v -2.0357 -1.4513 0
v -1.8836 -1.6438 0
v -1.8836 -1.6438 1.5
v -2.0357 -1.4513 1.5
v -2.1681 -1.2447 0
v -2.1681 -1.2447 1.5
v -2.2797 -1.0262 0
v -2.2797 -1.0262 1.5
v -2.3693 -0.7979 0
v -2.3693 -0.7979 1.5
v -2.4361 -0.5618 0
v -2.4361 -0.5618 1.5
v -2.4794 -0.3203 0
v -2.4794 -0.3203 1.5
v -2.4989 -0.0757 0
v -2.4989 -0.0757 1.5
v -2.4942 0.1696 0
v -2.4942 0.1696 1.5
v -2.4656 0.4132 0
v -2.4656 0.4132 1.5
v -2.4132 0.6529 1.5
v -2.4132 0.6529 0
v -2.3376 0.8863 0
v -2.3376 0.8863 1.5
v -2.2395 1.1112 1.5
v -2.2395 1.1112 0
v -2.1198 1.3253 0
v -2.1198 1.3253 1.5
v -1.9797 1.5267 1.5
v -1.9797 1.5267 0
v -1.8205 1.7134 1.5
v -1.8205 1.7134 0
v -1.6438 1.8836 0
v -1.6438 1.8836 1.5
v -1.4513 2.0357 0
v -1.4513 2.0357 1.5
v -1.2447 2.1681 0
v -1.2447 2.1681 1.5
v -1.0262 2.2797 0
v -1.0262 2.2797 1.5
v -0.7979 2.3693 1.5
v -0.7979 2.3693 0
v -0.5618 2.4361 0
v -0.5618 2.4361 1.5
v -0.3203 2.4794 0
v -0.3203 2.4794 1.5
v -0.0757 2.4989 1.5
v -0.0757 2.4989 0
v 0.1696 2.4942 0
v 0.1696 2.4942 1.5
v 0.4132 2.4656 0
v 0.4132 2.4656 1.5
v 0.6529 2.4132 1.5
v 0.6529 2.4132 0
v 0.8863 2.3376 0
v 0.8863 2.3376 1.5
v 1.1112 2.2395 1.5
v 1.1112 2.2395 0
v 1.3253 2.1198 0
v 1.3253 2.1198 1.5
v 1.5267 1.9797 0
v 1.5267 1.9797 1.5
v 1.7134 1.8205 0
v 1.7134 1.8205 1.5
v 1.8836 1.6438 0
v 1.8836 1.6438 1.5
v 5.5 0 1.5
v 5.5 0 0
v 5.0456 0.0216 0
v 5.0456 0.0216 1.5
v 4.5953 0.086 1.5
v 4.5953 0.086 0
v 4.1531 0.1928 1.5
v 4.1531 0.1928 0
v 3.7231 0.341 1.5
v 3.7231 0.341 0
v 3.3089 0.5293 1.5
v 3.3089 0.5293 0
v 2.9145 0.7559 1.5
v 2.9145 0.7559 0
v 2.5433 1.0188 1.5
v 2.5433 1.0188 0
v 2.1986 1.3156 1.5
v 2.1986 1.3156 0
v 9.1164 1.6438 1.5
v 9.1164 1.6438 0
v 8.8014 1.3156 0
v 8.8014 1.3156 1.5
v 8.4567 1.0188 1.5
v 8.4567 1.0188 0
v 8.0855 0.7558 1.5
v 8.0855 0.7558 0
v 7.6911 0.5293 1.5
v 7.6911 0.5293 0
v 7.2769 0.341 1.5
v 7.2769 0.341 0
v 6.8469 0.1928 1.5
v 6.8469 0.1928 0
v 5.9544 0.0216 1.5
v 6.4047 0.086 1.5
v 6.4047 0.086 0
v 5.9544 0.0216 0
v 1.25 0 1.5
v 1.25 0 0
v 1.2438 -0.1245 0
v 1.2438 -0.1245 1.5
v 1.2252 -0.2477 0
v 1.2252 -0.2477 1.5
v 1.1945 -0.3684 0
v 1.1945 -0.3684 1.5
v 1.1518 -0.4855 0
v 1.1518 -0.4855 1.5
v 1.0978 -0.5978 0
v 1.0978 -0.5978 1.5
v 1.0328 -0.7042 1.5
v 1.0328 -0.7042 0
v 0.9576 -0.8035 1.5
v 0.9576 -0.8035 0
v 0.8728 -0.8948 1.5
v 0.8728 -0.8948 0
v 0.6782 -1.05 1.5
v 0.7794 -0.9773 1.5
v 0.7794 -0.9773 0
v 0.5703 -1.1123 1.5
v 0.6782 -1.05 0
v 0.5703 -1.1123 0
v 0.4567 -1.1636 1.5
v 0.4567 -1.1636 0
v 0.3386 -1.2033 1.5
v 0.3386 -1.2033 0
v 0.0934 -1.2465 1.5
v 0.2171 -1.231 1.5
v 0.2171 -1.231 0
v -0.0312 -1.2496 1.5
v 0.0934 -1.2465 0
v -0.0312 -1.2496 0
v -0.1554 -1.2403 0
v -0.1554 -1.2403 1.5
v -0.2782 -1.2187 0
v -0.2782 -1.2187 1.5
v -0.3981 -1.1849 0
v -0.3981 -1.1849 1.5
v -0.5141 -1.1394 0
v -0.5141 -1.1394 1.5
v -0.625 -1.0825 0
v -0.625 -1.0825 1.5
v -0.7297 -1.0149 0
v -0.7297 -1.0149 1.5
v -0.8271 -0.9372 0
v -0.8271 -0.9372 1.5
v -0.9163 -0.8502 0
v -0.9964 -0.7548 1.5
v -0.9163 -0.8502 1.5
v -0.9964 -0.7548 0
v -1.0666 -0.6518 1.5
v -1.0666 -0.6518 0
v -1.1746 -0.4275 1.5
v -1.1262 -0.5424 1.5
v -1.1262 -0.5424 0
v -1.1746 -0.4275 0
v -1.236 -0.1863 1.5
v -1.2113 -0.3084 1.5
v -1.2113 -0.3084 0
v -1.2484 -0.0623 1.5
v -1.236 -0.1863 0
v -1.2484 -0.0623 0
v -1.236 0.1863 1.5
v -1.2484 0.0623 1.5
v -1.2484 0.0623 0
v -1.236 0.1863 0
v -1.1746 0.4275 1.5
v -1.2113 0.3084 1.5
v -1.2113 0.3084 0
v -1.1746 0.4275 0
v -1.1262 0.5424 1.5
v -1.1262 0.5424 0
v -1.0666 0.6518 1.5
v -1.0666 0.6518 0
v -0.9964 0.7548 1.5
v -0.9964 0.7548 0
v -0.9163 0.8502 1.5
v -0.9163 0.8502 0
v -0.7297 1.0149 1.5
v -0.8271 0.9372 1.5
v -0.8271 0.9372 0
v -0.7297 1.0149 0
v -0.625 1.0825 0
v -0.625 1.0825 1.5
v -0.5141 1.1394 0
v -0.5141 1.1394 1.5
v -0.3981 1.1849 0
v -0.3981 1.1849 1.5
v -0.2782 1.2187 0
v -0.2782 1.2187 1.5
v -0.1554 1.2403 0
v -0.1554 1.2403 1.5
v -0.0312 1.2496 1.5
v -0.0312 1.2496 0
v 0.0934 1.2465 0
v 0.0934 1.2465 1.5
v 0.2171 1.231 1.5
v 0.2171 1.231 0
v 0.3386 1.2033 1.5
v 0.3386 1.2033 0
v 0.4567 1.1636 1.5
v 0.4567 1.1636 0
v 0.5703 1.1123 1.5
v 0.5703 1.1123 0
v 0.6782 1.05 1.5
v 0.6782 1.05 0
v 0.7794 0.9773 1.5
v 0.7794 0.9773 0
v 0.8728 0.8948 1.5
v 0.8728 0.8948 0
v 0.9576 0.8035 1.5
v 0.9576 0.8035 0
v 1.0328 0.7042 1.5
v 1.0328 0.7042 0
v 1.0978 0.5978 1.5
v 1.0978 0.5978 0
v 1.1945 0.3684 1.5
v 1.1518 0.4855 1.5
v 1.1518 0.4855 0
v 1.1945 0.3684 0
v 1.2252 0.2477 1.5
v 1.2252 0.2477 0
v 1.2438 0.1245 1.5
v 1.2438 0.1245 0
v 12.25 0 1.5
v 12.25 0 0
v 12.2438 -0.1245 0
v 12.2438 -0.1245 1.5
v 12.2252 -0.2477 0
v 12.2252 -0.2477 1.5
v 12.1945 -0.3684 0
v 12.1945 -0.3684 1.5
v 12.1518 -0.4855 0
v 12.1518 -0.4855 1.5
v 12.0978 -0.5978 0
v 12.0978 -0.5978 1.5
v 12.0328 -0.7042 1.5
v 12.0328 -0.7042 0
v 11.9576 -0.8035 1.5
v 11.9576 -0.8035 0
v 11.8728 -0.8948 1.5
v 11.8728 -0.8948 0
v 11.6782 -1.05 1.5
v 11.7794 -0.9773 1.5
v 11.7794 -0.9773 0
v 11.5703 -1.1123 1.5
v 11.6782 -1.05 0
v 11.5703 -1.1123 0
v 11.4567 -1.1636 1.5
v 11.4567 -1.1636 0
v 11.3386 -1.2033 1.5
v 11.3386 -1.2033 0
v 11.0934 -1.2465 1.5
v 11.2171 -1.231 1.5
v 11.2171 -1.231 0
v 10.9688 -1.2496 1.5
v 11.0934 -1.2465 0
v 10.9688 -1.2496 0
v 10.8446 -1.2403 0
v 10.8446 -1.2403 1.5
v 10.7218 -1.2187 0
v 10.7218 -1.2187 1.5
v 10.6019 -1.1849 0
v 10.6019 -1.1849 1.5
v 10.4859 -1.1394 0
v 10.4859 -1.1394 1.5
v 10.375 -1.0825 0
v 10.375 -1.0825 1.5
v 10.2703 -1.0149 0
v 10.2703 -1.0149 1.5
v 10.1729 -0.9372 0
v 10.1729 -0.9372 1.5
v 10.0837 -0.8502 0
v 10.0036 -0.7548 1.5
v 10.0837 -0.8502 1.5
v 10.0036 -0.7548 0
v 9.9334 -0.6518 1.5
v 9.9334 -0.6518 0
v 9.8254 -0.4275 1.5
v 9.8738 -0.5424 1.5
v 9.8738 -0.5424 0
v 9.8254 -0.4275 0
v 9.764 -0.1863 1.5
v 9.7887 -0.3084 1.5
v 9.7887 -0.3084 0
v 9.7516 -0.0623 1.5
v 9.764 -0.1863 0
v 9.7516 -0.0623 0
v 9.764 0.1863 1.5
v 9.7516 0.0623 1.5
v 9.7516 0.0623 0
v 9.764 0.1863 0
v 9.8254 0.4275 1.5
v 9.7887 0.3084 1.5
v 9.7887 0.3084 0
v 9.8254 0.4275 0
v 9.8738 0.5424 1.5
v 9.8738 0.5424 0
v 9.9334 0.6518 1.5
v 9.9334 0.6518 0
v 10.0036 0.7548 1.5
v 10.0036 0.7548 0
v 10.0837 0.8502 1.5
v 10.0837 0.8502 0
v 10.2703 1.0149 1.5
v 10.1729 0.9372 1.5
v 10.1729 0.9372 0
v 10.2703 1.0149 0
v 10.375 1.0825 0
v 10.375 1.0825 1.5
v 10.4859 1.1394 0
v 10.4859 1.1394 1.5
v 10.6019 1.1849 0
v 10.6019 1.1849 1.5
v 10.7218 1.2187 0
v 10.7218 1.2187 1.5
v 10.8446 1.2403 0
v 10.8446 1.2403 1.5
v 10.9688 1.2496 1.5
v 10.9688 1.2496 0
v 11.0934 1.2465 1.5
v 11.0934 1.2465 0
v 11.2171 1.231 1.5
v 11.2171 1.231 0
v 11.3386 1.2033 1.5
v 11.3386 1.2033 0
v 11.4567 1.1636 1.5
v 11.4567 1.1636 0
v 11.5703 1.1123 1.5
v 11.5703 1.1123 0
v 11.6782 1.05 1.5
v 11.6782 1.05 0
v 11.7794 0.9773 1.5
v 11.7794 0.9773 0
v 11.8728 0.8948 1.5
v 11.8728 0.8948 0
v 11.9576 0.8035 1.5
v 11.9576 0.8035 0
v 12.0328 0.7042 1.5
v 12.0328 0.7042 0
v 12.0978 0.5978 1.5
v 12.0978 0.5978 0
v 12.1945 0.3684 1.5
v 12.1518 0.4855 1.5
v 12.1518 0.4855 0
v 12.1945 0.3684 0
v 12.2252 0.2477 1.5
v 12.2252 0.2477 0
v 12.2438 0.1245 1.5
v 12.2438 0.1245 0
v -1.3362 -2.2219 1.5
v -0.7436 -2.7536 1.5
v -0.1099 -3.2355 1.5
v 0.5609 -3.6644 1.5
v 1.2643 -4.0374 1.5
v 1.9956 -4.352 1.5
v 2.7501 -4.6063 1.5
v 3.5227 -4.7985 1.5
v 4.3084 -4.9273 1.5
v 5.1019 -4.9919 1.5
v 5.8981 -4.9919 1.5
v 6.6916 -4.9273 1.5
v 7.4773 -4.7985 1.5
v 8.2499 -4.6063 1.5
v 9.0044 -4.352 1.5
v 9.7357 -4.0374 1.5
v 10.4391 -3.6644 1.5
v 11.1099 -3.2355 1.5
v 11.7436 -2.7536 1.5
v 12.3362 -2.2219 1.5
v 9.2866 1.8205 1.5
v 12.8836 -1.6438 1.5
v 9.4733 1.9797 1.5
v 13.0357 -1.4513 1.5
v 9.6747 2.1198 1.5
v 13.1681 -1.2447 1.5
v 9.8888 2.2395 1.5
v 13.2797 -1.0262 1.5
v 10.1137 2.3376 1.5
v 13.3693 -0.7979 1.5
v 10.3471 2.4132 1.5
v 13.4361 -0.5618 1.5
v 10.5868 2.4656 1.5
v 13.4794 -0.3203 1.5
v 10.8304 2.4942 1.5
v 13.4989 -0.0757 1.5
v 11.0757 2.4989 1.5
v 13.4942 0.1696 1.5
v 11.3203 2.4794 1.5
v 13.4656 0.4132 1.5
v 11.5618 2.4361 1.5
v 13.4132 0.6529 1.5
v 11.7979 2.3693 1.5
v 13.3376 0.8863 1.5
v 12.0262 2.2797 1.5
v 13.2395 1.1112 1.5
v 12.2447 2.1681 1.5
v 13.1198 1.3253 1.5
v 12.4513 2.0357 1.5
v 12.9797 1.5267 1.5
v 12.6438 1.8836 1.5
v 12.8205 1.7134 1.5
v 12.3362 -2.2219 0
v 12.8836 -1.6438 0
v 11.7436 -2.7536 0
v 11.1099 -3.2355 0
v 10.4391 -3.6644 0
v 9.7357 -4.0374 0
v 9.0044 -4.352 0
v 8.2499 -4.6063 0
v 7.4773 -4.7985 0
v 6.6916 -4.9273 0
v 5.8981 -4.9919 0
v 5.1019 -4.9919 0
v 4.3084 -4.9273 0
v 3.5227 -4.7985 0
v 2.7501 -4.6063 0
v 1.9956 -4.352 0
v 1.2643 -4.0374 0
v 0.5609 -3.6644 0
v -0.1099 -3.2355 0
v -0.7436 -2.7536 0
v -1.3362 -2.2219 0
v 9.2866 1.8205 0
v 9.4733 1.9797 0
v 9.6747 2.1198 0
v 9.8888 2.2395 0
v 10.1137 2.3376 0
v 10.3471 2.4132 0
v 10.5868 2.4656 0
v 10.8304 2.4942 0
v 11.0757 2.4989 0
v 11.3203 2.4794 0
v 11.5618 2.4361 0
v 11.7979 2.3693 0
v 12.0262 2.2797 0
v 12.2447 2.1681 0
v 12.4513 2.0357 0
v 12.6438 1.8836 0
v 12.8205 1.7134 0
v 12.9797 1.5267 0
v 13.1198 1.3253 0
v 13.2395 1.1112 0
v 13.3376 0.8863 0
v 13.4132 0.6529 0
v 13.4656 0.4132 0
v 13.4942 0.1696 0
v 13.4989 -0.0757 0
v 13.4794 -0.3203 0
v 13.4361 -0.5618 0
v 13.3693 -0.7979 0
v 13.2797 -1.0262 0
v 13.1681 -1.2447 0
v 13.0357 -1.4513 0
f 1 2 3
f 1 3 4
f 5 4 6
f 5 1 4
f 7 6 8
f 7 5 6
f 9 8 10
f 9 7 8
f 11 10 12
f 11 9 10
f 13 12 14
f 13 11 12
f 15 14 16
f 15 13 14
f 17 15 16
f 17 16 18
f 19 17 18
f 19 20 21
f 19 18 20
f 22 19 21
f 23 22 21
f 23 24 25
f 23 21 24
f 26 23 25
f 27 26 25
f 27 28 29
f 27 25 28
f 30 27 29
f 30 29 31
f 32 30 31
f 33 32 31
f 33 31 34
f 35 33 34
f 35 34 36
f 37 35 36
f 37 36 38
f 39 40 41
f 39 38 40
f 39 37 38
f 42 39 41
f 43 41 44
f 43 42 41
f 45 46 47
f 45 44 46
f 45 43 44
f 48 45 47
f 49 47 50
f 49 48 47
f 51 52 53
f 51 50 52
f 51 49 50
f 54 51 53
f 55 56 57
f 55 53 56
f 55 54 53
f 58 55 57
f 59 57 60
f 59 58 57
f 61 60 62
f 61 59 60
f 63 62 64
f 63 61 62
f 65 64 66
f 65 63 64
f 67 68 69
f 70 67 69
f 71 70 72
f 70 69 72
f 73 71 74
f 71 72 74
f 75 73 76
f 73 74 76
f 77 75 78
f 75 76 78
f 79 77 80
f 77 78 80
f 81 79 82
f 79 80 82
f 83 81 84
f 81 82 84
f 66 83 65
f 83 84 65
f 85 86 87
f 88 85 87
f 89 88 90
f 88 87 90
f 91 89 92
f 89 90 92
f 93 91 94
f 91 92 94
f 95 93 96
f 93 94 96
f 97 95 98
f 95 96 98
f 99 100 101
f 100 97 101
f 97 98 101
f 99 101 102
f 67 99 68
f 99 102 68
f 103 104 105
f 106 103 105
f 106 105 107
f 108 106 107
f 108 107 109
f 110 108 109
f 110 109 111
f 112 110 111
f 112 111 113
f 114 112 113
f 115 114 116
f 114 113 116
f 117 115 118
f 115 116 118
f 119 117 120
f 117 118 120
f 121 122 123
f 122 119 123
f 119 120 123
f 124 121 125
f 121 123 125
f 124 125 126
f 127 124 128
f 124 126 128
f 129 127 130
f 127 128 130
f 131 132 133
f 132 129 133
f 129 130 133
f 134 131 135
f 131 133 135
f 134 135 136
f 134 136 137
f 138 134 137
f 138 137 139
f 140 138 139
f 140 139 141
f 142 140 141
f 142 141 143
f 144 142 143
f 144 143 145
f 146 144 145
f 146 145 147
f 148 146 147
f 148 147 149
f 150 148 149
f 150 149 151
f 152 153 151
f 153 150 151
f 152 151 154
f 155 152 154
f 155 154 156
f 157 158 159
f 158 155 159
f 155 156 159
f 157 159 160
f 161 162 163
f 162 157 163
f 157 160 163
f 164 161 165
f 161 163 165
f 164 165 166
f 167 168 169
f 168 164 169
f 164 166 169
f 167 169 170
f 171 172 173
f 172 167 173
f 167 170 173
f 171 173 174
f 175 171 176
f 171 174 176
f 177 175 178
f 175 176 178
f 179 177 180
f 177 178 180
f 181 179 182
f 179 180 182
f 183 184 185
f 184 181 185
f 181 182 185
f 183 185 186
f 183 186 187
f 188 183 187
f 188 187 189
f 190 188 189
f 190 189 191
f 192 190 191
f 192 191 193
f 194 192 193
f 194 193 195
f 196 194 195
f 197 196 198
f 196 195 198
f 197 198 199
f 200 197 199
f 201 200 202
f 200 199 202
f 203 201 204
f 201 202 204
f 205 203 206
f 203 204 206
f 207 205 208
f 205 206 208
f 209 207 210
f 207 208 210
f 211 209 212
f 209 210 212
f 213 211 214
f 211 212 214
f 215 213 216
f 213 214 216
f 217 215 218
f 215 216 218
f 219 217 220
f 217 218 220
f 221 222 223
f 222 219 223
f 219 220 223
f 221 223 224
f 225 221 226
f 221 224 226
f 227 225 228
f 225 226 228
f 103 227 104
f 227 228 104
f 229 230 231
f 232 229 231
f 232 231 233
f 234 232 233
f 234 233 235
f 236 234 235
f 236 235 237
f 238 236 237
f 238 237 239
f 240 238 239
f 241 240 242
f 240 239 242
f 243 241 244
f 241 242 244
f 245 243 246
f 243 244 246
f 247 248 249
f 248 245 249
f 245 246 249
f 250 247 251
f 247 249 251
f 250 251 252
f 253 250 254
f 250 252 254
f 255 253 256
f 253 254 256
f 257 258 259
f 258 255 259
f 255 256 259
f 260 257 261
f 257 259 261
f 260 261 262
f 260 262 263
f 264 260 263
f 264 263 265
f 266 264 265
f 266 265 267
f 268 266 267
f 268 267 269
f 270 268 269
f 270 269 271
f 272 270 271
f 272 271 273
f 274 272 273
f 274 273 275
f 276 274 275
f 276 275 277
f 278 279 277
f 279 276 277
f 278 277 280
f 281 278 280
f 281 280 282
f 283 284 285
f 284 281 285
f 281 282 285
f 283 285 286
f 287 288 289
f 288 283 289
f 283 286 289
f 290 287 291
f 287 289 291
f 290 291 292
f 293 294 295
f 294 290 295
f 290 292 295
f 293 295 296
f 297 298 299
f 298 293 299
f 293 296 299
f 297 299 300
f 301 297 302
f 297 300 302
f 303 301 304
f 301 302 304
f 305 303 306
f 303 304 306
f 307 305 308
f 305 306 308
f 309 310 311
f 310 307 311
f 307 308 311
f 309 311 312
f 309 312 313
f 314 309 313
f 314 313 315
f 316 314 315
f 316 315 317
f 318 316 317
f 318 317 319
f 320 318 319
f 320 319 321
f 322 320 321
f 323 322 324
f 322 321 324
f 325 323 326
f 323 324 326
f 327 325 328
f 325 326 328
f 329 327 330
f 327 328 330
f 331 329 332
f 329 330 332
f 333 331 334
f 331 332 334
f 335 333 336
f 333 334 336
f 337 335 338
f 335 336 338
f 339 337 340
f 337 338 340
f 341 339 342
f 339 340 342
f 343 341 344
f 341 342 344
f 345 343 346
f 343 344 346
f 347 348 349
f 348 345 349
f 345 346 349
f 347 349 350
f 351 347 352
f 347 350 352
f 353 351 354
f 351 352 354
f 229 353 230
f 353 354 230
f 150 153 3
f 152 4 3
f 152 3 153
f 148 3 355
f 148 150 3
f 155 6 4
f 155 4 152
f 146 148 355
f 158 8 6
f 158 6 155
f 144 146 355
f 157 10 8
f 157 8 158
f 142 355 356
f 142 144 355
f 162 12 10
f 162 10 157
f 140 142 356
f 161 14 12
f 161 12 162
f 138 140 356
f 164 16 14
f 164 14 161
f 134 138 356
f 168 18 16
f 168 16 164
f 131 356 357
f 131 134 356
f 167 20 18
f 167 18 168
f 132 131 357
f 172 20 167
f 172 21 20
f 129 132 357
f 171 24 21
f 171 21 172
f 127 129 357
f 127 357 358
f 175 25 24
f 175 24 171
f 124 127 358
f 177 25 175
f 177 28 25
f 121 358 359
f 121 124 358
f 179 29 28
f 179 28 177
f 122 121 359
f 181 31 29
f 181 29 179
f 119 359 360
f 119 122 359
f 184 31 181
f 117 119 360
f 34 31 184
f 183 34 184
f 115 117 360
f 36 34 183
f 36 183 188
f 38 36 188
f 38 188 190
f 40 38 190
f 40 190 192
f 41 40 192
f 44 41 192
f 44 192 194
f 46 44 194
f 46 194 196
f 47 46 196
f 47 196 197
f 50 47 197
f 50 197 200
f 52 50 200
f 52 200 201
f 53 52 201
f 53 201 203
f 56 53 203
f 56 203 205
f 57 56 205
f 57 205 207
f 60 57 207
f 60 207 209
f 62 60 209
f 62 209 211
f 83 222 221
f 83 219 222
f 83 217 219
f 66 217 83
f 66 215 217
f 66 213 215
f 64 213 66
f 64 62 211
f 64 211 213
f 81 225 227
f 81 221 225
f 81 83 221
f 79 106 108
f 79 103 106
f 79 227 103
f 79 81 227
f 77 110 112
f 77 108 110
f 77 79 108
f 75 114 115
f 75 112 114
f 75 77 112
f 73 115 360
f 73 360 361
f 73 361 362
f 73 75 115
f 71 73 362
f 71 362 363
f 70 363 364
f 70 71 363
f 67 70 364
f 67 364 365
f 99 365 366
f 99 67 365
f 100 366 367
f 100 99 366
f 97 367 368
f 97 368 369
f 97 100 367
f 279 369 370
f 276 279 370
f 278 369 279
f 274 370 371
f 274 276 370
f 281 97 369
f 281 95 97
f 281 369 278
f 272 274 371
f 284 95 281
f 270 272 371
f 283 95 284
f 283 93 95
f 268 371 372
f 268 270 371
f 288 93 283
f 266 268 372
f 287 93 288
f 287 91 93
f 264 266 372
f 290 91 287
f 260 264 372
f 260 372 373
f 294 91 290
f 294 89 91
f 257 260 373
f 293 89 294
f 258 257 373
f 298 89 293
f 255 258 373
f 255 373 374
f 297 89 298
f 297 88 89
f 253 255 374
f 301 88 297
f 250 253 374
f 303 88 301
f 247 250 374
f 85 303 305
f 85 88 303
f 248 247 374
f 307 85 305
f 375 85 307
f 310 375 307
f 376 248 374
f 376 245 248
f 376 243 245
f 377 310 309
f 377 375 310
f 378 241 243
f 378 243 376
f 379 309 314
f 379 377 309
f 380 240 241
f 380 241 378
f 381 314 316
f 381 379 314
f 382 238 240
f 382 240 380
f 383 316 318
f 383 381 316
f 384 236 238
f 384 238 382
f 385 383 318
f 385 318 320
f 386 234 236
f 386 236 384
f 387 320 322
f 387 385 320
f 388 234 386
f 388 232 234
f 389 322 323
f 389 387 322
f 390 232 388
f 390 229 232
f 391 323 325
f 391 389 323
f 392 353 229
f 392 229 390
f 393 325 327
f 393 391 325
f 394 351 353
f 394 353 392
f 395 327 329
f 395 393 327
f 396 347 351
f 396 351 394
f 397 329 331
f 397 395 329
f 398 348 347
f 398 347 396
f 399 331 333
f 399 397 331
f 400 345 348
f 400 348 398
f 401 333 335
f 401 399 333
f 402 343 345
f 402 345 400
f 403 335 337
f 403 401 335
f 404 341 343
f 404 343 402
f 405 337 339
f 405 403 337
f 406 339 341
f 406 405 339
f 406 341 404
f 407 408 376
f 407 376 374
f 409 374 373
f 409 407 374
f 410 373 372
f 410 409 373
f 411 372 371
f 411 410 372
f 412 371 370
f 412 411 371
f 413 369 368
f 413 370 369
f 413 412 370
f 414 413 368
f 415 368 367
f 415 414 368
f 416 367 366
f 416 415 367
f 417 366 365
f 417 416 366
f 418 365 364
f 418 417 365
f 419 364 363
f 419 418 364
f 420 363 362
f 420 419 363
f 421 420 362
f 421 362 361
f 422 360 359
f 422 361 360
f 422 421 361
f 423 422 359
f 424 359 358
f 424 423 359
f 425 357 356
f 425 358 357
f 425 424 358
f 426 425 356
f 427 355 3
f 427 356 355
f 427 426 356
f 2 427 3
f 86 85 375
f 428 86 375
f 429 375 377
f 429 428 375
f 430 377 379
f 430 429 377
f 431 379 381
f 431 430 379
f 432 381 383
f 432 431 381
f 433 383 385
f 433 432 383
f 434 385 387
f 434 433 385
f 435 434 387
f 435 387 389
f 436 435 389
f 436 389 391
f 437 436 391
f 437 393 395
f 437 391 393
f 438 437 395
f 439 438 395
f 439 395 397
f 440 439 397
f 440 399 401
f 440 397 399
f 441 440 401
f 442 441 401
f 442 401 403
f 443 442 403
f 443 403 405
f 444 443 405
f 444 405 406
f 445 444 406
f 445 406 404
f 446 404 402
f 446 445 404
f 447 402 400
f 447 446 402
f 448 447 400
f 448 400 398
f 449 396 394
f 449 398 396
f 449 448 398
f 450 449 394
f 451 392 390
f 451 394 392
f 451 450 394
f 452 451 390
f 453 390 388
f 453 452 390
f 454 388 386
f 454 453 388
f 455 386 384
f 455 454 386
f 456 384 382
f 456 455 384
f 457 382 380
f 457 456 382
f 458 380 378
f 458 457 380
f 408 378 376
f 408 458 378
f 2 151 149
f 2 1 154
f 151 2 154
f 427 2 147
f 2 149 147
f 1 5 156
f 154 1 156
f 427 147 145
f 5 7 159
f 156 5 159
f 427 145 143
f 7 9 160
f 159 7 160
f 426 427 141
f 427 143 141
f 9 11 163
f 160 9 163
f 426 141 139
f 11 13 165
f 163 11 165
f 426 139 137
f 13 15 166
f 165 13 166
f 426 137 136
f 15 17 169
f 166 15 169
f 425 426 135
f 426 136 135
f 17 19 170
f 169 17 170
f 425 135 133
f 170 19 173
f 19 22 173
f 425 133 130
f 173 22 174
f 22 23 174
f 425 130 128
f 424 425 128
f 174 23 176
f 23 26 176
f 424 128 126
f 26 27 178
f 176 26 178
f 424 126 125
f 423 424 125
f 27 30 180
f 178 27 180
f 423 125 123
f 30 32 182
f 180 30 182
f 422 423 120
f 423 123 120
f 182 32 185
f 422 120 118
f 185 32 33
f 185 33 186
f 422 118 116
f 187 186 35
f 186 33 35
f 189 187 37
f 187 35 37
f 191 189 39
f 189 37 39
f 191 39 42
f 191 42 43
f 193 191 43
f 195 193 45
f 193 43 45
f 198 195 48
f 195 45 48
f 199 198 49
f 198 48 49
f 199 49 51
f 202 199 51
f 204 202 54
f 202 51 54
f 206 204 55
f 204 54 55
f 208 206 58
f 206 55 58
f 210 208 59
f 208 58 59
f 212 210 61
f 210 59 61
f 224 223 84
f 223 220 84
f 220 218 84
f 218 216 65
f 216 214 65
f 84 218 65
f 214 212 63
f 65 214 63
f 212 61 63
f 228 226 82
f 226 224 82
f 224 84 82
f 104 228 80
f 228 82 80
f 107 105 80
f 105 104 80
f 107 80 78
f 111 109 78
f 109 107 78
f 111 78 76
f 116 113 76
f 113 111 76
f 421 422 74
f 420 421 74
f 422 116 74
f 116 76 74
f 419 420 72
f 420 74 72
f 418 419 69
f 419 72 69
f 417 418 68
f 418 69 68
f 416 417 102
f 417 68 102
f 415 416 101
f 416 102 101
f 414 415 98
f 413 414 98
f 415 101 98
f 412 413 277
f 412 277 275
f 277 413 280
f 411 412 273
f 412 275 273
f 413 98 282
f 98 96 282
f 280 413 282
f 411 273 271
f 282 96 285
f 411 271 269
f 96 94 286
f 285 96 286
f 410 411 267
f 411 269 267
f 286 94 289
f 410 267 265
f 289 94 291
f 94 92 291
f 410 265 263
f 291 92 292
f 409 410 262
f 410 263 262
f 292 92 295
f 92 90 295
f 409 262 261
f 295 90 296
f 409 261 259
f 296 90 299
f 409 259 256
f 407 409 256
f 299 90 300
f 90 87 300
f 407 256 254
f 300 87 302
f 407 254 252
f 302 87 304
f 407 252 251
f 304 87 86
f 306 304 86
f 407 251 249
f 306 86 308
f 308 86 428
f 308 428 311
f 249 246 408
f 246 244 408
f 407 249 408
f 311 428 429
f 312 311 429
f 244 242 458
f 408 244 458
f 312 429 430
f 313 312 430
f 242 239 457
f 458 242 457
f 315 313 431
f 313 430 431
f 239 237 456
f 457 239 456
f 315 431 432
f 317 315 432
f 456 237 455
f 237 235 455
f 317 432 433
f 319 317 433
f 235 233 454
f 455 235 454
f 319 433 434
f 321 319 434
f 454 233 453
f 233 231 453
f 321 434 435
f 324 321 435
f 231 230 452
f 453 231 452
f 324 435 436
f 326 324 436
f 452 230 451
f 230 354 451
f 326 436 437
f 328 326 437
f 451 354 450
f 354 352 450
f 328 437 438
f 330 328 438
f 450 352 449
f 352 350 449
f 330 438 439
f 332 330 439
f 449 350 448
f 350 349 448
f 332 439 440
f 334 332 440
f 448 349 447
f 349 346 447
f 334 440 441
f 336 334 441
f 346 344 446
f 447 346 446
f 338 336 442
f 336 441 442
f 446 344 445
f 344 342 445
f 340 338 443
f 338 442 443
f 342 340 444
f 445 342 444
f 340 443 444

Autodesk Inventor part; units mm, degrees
ref_plane "YZ Plane" through (0, 0, 0) normal (1, 0, 0) x (0, 1, 0)
ref_plane "XZ Plane" through (0, 0, 0) normal (0, 1, 0) x (-1, 0, 0)
ref_plane "XY Plane" through (0, 0, 0) normal (0, 0, 1) x (1, 0, 0)
sketch "Sketch1" plane through (0, 0, 0) normal (0, 0, 1) x (1, 0, 0)
  circle A0 centre (0, 0) radius 1.25
  line L0 (0, 0) -> (11, 0) construction
  circle A1 centre (11, 0) radius 1.25
  arc A2 (1.8836, 1.6438) -> (-1.8836, -1.6438) centre (0, 0) ccw
  arc A3 (12.8836, -1.6438) -> (9.1164, 1.6438) centre (11, 0) ccw
  arc A4 (-1.8836, -1.6438) -> (12.8836, -1.6438) centre (5.5, 4.8) ccw
  arc A5 (1.8836, 1.6438) -> (5.5, 0) centre (5.5, 4.8) ccw
  arc A6 (5.5, 0) -> (9.1164, 1.6438) centre (5.5, 4.8) ccw
  dimension "d0" = 2.5
  dimension "d1" = 11
  dimension "d8" = 5
extrude "Extrusion1" add sketch "Sketch1" along normal blind 1.5
properties part number "linkageC"
